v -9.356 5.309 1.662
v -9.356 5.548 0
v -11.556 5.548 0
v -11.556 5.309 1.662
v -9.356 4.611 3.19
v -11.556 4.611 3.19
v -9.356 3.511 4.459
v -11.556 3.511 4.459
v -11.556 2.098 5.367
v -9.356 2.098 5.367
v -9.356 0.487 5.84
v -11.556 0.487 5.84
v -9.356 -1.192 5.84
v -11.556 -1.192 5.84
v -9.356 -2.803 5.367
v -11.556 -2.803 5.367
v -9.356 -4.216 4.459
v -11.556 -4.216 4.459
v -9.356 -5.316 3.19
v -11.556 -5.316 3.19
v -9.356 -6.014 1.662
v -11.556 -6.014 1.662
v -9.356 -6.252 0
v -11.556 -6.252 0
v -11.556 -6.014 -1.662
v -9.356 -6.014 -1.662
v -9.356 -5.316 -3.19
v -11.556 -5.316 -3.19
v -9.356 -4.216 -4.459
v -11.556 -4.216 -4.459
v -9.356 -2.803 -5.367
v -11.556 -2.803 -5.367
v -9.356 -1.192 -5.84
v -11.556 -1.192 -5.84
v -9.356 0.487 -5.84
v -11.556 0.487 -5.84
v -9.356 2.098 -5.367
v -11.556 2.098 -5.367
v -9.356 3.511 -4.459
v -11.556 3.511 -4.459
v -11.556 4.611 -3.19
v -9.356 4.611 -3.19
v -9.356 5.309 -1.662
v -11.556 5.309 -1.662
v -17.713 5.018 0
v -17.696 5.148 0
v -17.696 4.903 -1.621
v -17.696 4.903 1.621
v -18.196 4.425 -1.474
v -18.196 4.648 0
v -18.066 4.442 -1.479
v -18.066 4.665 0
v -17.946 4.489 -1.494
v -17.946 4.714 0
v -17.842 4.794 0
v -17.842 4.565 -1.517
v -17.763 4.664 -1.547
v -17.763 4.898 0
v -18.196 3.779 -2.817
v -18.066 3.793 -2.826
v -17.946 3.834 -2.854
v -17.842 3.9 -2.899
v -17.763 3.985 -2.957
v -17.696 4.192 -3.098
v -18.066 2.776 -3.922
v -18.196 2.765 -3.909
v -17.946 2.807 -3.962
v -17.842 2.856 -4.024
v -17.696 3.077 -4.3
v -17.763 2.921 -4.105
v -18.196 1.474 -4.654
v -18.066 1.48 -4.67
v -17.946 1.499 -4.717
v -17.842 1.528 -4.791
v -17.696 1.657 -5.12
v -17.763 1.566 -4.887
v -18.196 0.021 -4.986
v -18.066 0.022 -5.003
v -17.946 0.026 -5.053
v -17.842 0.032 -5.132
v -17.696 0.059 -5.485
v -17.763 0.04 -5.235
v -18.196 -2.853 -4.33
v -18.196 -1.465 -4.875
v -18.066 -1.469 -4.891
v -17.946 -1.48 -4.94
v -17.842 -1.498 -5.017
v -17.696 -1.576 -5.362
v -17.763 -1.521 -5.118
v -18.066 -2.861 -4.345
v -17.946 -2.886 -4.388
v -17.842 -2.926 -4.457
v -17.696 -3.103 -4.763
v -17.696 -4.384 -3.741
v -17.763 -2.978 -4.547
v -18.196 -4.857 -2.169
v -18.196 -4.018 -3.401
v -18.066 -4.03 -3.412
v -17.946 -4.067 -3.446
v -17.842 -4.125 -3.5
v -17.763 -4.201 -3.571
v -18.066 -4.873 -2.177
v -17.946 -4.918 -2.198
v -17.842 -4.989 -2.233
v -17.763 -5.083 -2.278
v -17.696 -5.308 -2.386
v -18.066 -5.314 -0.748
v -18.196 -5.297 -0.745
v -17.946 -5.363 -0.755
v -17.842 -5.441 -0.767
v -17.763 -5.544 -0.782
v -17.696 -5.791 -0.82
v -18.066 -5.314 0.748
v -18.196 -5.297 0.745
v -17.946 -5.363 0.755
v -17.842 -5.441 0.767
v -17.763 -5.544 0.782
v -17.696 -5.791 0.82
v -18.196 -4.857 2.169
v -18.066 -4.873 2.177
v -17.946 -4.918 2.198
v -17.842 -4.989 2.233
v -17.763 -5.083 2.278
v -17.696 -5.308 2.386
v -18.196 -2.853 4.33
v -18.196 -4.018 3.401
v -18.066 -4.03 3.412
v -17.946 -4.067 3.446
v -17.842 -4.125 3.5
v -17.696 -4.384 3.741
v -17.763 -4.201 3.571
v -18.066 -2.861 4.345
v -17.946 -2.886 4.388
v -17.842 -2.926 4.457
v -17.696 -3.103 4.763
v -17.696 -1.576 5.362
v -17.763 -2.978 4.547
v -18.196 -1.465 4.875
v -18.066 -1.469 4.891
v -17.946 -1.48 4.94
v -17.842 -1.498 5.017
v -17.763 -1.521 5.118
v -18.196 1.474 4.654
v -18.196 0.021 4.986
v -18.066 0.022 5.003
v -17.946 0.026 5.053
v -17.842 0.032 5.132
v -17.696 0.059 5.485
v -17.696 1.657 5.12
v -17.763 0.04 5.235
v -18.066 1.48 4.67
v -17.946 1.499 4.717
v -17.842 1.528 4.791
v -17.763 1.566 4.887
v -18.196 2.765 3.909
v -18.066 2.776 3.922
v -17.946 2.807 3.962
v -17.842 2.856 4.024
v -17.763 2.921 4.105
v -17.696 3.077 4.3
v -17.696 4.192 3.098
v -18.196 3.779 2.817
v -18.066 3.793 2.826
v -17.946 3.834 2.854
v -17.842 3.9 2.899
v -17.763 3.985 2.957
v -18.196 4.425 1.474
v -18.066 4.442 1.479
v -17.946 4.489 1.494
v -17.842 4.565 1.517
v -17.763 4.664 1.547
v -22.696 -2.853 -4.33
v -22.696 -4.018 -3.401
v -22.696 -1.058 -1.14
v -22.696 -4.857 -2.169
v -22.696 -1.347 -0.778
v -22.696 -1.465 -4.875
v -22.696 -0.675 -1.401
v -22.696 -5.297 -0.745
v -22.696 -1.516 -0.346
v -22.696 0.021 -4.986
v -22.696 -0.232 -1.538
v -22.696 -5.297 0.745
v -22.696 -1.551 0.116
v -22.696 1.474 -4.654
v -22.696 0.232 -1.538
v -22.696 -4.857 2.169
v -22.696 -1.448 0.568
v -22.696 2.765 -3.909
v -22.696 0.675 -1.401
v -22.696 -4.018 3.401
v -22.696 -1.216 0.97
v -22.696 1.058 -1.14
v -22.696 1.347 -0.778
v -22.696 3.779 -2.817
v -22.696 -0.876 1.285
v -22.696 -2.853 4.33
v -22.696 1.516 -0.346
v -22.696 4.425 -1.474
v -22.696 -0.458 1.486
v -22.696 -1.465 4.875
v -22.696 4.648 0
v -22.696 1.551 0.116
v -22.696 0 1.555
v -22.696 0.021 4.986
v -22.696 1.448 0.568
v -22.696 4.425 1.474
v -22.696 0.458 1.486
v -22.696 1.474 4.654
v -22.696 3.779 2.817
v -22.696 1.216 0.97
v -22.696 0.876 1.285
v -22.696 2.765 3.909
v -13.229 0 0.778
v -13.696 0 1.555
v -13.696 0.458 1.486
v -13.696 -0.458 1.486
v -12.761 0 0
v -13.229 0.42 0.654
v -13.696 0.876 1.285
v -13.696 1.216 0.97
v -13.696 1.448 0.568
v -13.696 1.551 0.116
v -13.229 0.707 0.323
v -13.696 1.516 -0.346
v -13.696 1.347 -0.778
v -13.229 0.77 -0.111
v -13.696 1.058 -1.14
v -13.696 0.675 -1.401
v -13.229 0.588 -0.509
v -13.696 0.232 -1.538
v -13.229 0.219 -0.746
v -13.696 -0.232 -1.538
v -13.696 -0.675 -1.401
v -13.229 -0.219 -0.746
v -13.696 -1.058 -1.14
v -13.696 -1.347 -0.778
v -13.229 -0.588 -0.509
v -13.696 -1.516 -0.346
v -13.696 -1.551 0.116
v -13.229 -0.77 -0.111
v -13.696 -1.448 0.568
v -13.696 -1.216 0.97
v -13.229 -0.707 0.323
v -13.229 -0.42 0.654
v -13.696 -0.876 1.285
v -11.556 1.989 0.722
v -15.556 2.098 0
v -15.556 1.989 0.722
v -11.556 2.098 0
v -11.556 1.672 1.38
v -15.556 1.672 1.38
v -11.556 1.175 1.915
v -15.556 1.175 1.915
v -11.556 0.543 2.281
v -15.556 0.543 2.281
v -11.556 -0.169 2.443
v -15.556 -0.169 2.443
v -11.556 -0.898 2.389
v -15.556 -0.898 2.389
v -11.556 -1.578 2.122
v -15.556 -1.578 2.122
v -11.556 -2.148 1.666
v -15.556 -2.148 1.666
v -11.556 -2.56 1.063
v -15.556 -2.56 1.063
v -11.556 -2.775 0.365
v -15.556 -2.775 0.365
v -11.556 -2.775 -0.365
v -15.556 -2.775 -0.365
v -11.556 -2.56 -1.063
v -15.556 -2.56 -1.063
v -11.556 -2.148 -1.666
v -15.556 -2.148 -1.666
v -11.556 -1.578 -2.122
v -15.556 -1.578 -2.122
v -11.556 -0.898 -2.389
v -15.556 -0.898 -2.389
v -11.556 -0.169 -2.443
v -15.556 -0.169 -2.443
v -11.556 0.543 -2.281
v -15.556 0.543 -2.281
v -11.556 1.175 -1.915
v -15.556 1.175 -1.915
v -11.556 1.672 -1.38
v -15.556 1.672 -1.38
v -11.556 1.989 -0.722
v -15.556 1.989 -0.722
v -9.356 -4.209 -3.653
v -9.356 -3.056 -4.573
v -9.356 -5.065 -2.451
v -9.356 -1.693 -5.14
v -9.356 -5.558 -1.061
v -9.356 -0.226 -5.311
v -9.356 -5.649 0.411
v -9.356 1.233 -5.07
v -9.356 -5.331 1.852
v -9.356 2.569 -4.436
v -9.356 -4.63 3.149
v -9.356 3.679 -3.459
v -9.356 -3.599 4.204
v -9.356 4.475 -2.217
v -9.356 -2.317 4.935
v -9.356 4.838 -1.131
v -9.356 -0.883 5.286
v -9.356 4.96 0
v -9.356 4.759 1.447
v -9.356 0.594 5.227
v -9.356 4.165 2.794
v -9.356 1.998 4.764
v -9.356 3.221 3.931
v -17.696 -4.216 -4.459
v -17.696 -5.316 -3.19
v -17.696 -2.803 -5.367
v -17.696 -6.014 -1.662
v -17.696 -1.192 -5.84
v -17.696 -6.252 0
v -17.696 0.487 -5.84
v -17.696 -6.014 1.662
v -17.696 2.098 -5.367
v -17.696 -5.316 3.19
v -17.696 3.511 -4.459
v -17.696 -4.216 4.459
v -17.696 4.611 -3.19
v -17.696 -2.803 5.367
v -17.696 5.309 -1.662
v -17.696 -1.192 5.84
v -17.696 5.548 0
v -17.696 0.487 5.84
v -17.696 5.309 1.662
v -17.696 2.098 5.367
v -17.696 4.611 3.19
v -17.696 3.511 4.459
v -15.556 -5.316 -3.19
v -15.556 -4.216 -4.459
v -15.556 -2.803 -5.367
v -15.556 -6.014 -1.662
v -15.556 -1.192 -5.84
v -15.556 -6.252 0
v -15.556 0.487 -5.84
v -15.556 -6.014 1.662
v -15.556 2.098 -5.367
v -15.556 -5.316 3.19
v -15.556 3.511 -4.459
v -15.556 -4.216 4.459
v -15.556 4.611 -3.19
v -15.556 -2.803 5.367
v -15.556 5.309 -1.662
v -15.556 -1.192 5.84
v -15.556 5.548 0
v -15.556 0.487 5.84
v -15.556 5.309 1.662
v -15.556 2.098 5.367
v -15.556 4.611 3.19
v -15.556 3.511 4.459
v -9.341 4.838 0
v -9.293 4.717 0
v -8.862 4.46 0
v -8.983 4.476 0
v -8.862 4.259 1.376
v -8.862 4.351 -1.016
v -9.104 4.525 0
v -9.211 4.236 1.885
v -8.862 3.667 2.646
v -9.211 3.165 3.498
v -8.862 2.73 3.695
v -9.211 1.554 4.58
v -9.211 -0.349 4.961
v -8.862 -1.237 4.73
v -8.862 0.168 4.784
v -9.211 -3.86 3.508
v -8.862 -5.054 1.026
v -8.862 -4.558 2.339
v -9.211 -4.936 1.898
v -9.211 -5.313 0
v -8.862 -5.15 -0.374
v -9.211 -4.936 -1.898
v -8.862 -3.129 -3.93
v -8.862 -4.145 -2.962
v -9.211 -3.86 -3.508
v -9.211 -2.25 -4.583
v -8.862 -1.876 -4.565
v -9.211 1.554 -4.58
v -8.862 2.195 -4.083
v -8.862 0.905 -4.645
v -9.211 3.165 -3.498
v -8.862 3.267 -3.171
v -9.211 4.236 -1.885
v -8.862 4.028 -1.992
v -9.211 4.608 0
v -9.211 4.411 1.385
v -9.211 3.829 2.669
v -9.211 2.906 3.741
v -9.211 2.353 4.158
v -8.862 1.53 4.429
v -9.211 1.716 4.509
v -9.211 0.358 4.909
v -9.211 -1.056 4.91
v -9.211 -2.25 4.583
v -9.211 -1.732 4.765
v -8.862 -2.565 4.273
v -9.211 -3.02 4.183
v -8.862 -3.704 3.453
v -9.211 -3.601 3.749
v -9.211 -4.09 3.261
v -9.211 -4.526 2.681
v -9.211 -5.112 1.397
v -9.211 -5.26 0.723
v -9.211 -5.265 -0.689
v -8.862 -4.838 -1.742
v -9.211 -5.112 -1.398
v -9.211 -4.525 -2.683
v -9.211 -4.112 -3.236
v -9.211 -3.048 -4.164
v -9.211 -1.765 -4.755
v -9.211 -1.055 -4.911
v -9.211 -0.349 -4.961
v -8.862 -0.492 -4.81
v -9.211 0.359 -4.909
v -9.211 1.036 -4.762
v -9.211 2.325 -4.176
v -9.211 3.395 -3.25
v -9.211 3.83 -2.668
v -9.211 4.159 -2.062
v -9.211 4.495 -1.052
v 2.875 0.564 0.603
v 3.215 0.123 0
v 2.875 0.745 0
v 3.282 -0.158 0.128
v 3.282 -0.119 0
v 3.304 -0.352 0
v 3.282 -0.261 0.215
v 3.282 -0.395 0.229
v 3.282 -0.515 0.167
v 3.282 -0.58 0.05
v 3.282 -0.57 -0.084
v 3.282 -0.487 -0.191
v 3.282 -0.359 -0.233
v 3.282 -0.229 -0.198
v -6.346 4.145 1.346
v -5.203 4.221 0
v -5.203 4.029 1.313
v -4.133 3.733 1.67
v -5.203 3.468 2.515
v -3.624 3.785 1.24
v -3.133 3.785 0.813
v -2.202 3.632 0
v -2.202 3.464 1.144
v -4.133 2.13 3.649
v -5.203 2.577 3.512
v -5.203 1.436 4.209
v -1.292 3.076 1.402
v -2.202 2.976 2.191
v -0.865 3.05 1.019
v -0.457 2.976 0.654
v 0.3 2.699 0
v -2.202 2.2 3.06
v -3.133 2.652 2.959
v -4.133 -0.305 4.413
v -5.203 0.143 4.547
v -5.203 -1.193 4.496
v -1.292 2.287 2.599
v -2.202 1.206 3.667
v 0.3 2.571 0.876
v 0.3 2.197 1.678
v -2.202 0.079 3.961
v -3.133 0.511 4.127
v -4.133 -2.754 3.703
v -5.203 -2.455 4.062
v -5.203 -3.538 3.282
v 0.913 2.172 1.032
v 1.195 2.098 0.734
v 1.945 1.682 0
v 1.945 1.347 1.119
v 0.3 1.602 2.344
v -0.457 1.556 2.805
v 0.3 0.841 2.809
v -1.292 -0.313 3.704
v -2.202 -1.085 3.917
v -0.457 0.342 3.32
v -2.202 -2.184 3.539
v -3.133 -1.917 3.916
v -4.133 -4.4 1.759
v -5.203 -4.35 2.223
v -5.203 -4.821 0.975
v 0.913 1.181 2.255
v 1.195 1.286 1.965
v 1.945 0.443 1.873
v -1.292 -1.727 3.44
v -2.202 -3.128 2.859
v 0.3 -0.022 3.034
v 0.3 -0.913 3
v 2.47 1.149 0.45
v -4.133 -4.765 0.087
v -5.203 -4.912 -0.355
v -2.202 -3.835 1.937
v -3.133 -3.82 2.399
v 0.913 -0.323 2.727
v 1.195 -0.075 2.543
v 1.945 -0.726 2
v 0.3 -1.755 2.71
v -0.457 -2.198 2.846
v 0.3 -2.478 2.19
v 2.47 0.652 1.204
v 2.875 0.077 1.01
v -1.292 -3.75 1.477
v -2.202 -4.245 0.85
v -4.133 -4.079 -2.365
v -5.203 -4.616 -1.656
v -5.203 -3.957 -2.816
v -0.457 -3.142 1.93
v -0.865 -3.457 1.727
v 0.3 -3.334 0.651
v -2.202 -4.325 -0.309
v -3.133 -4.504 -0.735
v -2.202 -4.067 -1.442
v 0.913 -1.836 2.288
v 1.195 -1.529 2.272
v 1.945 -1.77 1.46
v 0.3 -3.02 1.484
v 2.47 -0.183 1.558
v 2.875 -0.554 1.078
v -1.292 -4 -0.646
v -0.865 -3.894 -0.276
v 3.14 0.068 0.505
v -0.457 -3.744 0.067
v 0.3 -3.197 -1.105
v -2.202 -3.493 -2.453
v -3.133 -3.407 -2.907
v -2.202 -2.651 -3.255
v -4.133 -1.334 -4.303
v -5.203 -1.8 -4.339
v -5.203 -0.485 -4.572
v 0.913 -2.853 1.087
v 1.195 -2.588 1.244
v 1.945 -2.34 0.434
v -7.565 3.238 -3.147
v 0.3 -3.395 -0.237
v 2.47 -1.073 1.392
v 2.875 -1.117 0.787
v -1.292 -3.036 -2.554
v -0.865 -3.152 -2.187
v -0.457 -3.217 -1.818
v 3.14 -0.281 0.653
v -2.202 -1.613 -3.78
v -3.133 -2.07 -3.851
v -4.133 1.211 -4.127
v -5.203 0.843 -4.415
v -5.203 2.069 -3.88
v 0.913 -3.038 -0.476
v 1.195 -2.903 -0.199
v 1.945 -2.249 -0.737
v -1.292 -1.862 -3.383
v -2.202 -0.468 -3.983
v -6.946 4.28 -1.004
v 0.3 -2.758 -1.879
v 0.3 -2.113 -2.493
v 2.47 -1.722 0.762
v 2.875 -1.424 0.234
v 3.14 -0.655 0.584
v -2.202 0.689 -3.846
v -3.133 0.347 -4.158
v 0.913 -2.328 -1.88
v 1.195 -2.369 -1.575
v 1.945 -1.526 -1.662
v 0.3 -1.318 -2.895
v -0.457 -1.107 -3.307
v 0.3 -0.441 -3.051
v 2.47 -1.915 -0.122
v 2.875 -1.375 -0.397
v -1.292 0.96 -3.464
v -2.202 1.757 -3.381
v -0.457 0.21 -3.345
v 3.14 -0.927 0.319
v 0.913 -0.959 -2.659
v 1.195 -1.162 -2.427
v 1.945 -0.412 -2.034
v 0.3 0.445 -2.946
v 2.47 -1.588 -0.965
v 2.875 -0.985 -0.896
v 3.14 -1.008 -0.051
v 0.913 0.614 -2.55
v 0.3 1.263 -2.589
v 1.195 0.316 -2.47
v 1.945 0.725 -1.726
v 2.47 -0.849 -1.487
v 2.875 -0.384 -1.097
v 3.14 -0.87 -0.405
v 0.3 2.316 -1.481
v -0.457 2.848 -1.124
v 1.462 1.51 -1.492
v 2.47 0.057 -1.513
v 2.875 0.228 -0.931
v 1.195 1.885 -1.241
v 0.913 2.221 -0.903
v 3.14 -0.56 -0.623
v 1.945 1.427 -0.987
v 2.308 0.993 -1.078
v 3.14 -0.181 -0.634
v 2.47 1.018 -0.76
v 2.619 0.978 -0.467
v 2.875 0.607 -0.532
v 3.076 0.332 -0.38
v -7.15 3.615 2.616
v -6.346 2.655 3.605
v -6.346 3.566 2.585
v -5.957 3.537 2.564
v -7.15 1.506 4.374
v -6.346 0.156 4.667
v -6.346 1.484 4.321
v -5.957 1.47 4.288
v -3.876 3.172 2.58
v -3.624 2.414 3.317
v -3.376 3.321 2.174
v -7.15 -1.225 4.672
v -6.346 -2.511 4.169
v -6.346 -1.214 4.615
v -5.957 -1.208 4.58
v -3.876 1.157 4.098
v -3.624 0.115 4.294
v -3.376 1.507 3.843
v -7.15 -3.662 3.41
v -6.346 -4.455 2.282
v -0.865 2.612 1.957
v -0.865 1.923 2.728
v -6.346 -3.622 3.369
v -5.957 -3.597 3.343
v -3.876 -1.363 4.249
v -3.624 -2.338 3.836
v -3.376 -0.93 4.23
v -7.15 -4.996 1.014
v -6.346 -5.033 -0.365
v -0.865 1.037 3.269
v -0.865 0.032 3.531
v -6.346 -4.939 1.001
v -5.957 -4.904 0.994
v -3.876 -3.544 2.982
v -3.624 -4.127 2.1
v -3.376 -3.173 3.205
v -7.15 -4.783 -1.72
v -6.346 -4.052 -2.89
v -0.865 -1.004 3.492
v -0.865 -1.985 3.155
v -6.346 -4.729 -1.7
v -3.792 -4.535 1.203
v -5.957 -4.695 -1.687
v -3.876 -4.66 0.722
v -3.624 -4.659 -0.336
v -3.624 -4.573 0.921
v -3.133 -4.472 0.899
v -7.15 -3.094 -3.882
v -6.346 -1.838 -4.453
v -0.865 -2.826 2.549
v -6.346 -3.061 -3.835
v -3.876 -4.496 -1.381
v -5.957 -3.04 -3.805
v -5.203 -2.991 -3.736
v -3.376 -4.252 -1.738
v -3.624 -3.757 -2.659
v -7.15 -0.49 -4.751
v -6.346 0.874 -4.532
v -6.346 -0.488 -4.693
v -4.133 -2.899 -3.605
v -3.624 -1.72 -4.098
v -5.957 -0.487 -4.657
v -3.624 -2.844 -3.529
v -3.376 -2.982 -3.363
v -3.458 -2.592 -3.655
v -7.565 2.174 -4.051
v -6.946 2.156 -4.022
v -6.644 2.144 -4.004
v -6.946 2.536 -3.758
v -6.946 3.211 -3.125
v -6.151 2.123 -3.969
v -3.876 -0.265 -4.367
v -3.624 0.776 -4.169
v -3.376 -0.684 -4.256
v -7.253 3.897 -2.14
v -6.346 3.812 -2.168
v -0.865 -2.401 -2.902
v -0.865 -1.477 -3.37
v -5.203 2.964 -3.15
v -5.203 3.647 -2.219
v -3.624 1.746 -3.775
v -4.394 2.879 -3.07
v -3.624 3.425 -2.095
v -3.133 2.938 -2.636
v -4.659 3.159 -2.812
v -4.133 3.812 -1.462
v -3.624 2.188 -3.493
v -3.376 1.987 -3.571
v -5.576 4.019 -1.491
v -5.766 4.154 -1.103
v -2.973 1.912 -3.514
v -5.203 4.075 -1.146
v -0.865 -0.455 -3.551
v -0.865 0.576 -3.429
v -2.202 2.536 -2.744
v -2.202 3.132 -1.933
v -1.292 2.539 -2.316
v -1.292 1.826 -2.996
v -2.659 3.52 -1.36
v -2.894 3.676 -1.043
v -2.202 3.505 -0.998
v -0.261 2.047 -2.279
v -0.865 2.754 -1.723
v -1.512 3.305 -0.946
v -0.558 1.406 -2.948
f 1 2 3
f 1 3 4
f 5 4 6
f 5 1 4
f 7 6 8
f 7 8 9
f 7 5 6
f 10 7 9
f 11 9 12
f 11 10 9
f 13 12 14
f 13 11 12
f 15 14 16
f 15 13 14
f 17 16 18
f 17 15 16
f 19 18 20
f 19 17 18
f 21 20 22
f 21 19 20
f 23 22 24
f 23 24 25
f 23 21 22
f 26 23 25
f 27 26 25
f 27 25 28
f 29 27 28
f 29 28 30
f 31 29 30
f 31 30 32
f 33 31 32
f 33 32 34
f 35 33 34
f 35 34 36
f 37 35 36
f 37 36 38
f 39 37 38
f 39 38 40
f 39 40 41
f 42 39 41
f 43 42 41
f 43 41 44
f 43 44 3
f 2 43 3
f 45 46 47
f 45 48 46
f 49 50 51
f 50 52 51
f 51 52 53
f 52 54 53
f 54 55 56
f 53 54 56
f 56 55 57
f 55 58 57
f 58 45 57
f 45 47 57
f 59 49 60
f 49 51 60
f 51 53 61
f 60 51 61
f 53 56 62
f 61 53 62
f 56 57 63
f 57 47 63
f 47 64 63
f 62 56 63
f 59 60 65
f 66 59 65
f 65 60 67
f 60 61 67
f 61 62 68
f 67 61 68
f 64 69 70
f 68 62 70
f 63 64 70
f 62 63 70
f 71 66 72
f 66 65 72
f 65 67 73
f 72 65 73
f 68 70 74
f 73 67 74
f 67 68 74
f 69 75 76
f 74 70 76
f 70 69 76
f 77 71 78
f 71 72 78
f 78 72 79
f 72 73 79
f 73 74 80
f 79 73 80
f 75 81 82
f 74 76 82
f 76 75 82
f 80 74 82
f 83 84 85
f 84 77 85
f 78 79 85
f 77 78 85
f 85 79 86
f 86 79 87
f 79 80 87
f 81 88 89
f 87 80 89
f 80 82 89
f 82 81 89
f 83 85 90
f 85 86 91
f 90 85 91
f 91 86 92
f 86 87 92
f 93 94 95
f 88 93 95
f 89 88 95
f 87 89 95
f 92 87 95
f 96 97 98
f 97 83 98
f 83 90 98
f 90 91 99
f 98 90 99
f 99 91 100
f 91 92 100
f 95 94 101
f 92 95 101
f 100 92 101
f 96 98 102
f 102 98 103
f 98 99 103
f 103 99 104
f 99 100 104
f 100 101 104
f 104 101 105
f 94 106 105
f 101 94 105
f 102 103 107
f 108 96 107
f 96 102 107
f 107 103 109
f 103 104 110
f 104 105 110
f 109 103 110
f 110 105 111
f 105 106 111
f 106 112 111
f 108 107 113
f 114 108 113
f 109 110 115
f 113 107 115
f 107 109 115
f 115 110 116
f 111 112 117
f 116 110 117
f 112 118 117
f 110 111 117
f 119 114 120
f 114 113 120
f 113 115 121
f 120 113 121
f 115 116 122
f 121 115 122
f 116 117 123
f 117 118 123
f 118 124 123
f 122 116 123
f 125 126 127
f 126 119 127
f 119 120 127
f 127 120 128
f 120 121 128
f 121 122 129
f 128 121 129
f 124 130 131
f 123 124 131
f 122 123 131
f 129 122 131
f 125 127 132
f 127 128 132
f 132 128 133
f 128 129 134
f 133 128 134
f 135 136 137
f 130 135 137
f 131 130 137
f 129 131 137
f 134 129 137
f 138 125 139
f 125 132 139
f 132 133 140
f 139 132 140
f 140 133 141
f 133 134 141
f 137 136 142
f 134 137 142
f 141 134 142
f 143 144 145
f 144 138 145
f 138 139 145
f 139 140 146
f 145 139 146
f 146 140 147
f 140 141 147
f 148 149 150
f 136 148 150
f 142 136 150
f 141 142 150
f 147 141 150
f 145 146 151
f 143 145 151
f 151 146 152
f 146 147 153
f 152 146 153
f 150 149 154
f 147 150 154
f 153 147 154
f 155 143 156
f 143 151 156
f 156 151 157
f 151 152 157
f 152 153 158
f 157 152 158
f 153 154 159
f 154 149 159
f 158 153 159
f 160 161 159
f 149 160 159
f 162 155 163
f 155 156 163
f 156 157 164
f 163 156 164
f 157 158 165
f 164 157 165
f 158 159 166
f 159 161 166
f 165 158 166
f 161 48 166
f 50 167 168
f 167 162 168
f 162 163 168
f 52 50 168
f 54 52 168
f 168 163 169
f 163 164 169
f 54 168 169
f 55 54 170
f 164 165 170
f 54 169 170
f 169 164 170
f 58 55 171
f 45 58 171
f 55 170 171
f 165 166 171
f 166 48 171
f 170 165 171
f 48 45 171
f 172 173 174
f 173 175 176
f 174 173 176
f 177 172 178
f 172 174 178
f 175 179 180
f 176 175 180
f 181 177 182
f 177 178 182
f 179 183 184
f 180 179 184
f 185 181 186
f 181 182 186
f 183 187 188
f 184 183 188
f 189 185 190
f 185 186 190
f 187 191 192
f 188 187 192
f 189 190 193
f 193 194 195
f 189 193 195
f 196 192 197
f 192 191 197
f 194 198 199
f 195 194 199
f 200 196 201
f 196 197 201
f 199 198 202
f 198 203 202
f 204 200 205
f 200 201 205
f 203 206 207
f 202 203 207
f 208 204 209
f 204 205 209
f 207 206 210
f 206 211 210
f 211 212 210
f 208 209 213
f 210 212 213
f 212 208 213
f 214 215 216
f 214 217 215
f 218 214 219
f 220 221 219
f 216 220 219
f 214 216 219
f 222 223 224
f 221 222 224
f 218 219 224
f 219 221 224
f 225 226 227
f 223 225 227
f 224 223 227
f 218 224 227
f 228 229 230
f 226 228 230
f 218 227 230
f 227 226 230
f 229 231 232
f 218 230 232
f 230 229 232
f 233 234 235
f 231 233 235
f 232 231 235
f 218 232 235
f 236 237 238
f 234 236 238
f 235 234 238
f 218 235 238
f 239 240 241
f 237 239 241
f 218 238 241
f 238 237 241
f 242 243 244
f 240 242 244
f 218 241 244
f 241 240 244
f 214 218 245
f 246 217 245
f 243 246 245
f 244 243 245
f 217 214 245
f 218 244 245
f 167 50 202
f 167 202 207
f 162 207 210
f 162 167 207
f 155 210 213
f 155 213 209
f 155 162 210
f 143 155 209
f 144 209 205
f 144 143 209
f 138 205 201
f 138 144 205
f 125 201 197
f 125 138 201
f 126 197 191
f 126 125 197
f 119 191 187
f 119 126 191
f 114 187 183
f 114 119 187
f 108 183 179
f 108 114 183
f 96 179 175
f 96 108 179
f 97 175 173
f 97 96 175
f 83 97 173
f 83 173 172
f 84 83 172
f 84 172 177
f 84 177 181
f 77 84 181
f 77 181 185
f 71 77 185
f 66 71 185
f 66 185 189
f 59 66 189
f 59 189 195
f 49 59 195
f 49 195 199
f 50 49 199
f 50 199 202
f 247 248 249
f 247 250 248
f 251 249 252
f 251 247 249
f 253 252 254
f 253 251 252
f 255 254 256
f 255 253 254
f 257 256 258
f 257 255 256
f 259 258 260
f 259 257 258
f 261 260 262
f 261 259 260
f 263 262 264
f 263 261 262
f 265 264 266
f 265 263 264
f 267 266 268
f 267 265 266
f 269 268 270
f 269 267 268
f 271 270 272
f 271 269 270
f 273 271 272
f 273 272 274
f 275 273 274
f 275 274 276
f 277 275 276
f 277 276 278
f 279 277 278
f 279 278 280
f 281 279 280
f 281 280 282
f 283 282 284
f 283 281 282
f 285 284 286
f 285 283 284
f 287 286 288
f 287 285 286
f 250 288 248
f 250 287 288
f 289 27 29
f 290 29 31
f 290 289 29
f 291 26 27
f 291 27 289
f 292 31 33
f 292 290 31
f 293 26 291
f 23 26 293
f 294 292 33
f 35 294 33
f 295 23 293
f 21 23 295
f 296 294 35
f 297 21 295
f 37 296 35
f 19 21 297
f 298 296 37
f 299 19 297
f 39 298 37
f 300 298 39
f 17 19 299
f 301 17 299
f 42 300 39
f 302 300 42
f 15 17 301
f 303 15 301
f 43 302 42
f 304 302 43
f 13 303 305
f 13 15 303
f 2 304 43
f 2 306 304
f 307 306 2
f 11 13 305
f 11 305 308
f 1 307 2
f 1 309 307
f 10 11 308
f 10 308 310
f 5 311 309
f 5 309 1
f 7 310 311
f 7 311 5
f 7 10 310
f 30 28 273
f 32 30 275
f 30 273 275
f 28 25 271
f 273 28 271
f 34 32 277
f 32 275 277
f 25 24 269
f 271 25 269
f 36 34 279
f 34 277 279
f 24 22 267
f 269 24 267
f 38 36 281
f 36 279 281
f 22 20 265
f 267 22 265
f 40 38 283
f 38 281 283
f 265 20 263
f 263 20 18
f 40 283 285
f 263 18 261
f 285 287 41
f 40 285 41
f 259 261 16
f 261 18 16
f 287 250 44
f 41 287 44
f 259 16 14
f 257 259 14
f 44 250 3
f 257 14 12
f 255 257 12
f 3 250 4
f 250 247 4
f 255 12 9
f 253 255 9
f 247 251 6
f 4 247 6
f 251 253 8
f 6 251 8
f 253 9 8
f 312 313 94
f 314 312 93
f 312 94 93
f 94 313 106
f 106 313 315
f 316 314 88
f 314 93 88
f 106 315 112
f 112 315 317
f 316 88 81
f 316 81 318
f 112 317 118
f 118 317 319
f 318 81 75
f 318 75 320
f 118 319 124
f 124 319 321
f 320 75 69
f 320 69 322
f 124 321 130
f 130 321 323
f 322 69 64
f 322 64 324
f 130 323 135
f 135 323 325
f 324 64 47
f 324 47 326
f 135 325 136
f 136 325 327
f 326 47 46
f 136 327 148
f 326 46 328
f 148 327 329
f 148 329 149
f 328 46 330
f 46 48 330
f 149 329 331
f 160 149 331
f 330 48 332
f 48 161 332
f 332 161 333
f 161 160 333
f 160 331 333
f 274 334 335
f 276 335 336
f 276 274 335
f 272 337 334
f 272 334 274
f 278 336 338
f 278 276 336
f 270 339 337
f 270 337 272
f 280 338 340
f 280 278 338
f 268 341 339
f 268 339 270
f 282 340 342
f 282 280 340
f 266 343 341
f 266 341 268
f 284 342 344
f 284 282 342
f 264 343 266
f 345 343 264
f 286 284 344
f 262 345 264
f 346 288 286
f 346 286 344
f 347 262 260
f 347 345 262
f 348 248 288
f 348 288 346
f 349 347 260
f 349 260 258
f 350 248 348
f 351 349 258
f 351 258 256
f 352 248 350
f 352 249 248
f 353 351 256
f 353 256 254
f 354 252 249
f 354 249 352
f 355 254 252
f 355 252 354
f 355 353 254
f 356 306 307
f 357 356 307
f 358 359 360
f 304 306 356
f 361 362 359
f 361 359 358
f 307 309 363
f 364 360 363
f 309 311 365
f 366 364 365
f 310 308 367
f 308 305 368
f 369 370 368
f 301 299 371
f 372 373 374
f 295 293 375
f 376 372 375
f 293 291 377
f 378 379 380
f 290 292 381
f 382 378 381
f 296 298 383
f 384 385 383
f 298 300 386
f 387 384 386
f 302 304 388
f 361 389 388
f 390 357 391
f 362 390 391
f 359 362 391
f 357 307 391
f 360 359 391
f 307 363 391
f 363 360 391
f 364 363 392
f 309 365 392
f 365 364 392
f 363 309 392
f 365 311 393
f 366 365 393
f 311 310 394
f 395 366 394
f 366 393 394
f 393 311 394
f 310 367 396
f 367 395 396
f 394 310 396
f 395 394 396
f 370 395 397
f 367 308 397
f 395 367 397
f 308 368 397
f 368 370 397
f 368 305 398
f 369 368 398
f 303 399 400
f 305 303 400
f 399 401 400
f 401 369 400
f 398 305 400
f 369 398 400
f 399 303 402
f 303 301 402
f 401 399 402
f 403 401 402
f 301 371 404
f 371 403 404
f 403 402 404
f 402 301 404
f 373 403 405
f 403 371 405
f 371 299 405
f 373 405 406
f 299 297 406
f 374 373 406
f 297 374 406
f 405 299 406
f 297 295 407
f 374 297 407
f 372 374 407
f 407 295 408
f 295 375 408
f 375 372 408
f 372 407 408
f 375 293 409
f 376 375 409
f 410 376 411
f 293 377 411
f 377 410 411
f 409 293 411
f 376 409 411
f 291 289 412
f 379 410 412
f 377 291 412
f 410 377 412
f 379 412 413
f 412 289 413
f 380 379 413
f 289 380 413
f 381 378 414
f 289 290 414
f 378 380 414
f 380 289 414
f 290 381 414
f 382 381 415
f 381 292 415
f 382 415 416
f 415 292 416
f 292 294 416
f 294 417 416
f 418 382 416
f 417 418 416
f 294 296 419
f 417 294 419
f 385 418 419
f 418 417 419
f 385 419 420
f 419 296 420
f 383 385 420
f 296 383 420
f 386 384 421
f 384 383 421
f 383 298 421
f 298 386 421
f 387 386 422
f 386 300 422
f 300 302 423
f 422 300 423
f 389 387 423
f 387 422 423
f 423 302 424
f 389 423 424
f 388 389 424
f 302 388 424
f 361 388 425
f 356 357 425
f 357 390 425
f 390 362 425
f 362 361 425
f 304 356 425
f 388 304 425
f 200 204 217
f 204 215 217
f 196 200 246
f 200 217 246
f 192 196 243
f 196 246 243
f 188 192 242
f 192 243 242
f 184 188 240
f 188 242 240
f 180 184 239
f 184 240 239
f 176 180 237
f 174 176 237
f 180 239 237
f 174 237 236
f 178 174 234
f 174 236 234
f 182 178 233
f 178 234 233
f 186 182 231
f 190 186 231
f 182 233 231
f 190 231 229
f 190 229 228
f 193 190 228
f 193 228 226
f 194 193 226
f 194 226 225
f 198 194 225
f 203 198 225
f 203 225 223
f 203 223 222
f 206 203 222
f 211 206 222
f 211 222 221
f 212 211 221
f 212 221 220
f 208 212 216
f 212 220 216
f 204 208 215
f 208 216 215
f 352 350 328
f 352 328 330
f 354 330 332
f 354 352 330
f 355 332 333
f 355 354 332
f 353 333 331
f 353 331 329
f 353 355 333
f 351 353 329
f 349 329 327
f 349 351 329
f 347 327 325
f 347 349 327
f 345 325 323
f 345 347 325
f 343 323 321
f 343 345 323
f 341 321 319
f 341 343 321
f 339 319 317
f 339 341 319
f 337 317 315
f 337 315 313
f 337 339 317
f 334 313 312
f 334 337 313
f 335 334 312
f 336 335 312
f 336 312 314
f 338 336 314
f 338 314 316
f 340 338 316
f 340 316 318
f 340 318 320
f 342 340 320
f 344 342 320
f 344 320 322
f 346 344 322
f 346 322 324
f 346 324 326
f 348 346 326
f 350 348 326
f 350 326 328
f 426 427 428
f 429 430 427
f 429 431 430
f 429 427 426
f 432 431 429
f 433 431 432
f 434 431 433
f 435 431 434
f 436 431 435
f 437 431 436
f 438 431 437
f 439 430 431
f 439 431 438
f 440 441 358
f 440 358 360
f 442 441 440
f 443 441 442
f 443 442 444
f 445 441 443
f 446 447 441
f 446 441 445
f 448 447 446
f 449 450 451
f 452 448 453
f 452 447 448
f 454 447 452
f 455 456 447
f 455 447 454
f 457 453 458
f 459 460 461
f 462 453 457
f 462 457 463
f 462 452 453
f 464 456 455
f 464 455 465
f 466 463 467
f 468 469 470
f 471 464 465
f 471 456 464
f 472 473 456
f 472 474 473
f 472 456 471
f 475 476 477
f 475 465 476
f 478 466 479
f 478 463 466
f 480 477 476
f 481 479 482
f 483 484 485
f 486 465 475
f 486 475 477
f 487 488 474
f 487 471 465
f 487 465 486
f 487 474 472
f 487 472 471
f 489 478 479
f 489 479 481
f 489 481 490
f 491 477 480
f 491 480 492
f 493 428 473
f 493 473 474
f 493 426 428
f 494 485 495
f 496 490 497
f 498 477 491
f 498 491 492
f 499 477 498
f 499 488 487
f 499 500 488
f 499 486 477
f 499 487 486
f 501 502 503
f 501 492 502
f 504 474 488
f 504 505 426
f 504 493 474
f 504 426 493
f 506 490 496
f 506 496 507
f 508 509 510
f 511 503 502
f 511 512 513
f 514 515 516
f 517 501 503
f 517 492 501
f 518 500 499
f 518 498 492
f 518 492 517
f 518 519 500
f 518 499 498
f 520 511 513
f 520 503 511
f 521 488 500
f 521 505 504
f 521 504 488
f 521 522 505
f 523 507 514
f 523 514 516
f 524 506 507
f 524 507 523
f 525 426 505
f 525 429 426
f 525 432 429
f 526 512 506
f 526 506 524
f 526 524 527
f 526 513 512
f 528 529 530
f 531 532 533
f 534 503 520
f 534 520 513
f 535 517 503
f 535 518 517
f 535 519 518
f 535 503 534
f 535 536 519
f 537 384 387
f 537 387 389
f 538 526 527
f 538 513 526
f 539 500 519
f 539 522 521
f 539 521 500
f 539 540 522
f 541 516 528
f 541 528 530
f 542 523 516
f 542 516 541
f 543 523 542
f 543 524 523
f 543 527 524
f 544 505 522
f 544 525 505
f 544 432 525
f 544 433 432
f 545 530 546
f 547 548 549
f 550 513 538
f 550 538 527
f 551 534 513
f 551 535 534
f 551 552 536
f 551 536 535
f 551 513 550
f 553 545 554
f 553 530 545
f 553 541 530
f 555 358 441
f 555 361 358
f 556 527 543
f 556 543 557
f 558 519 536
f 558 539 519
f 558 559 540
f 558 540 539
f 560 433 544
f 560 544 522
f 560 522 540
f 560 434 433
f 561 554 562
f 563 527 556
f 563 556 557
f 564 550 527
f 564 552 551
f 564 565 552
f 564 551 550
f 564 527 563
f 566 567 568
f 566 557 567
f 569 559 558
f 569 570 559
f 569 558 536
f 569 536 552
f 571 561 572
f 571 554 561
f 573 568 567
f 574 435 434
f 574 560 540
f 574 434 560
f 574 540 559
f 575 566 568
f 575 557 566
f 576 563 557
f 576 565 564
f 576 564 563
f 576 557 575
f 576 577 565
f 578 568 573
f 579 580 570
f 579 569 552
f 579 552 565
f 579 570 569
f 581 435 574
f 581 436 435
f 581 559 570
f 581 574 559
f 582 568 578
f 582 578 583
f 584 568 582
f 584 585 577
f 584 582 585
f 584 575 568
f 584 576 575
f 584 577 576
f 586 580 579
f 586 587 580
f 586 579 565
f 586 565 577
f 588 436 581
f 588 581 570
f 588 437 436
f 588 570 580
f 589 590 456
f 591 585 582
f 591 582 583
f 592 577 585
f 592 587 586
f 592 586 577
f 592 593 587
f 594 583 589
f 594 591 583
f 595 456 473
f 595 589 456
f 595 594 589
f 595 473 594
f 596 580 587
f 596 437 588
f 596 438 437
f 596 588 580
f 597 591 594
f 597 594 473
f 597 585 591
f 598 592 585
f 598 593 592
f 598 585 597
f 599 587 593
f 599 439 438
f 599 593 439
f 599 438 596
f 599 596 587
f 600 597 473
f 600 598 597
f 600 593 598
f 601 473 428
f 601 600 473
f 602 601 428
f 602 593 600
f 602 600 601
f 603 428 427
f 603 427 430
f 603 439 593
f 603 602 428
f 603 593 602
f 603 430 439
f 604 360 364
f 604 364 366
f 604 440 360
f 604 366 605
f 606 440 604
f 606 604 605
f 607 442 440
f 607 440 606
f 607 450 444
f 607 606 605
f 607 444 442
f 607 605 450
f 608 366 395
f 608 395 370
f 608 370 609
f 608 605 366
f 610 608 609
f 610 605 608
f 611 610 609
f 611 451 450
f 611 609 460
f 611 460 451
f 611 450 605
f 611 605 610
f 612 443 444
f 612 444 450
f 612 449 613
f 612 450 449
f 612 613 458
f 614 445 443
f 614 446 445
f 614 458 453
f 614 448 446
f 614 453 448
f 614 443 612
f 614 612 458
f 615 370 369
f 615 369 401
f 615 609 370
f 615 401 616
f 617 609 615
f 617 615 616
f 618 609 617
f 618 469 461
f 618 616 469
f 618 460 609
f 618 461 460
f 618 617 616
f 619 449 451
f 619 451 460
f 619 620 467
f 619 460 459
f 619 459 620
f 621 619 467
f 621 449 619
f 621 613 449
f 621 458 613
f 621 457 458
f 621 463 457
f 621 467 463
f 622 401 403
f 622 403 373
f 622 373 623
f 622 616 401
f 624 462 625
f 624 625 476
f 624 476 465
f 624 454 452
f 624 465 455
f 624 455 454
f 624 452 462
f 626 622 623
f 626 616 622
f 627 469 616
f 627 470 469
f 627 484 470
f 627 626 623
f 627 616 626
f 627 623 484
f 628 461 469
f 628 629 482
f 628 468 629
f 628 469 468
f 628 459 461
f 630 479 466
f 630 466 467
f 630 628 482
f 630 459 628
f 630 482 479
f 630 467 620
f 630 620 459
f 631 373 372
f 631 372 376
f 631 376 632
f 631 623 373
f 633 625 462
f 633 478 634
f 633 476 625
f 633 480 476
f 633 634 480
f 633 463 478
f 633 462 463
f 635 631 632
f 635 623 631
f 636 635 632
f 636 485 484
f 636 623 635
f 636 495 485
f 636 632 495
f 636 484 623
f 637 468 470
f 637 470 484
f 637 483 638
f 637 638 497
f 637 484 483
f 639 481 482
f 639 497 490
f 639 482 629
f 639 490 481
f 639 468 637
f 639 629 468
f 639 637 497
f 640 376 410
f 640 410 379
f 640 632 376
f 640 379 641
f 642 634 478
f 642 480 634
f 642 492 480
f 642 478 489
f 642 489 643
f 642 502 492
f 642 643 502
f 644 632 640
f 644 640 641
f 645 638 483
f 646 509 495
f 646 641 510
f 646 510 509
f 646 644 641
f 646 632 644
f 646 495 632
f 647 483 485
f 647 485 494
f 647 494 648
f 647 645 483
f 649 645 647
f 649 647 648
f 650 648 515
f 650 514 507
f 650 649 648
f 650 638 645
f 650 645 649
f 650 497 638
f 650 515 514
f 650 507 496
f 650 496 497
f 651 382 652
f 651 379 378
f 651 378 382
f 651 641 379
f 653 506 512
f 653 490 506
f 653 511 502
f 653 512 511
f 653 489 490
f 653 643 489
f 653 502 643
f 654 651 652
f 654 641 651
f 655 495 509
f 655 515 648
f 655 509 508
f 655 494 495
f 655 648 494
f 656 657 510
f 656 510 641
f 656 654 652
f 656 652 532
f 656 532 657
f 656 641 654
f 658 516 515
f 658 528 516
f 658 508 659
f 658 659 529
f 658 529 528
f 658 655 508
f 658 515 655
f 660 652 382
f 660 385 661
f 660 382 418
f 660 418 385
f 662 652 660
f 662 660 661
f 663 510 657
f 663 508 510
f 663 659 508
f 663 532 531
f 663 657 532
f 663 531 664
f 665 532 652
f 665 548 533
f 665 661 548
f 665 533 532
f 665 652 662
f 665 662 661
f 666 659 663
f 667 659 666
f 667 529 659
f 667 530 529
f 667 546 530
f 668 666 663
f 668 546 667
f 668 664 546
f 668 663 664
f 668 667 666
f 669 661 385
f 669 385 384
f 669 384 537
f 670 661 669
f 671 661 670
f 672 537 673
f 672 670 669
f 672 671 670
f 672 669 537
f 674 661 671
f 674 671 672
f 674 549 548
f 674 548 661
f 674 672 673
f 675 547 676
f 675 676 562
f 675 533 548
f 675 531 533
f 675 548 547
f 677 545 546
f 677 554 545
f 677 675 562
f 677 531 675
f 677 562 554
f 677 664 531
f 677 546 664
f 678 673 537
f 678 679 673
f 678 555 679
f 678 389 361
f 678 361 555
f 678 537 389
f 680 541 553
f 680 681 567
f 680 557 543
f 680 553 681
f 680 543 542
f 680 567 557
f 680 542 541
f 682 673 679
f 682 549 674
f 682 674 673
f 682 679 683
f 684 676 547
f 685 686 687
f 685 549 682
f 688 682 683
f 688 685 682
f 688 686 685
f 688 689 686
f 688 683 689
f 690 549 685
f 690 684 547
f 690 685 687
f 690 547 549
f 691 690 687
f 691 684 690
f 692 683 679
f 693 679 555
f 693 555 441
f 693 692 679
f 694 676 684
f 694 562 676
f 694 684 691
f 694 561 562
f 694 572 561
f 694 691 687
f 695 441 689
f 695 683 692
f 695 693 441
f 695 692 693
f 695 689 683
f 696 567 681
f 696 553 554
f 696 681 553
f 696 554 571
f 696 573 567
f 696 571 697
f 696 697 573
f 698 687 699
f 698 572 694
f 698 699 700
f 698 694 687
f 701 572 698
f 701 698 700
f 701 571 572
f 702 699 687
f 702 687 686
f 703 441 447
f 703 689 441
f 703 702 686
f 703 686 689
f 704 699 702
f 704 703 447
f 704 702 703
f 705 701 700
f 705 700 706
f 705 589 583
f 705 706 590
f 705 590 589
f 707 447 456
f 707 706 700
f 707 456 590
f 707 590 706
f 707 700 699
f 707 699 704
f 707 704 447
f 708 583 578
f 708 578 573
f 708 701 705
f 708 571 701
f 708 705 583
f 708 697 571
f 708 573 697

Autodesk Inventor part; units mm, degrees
ref_plane "YZ Plane" through (0, 0, 0) normal (1, 0, 0) x (0, 1, 0)
ref_plane "XZ Plane" through (0, 0, 0) normal (0, 1, 0) x (-1, 0, 0)
ref_plane "XY Plane" through (0, 0, 0) normal (0, 0, 1) x (1, 0, 0)
sketch "Szkic1" plane through (0, 0, 0) normal (0, 0, 1) x (1, 0, 0)
  line L0 (-24.8894, -0.3525) -> (25.4856, -0.3525)
  line L1 (-22.6958, -0.3525) -> (-22.6958, 4.6475)
  line L2 (-22.6958, 4.6475) -> (-17.6958, 4.6475)
  line L3 (-17.6958, 4.6475) -> (-17.6958, 5.5475)
  line L4 (-17.6958, 5.5475) -> (-15.5558, 5.5475)
  line L5 (-15.5558, 5.5475) -> (-15.5558, 2.0975)
  line L6 (-15.5558, 2.0975) -> (-11.5558, 2.0975)
  line L7 (-11.5558, 2.0975) -> (-11.5558, 5.5475)
  line L8 (-11.5558, 5.5475) -> (-9.3558, 5.5475)
  line L9 (-9.3558, 5.5475) -> (-9.3558, 4.4625)
  line L10 (-9.3558, 4.4625) -> (-3.2506, 4.4625) construction
  line L11 (-3.2506, 4.4625) -> (0.6286, 3.2981) construction
  line L12 (0.6286, 3.2981) -> (3.3042, 1.1615) construction
  line L13 (3.3042, 1.1615) -> (3.3042, -0.3525) construction
  spline S0 degree 4 poles (-9.3558, 4.4625) (-3.2506, 4.4625) (0.6286, 3.2981) (3.3042, 1.1615) (3.3042, -0.3525) knots 1 1 1 1 1 2 2 2 2 2
  point P0 (0, 0)
  point P1 (-16.6258, 5.5475)
  point P2 (-10.4558, 5.5475)
  dimension "d0" = 10
  dimension "d1" = 5
  dimension "d2" = 11.8
  dimension "d3" = 7.14
  dimension "d4" = 4.9
  dimension "d5" = 4
  dimension "d6" = 2.2
  dimension "d7" = 9.63
  dimension "d8" = 26
revolve "Obrót1" add sketch "Szkic1" angle 360 about axis through (-24.8894, -0.3525, 0) along (1, 0, 0)
fillet "Zaokrąglenie1" radius 0.5 2 edges at (-9.3558, -5.1675, 0) (-17.6958, -5.3525, 0)
sketch "Szkic2" plane through (-22.6958, -0.3525, 0) normal (-1, 0, 0) x (0, 0, 1)
  point P0 (0, 0.3525)
  point P1 (0, 0.3525)
hole "Otwór1" at (-22.6958, 0, 0) direction (1, 0, 0) diameter 3.11 depth 9 tip angle 118
properties part number "mocowanie_smigla"
